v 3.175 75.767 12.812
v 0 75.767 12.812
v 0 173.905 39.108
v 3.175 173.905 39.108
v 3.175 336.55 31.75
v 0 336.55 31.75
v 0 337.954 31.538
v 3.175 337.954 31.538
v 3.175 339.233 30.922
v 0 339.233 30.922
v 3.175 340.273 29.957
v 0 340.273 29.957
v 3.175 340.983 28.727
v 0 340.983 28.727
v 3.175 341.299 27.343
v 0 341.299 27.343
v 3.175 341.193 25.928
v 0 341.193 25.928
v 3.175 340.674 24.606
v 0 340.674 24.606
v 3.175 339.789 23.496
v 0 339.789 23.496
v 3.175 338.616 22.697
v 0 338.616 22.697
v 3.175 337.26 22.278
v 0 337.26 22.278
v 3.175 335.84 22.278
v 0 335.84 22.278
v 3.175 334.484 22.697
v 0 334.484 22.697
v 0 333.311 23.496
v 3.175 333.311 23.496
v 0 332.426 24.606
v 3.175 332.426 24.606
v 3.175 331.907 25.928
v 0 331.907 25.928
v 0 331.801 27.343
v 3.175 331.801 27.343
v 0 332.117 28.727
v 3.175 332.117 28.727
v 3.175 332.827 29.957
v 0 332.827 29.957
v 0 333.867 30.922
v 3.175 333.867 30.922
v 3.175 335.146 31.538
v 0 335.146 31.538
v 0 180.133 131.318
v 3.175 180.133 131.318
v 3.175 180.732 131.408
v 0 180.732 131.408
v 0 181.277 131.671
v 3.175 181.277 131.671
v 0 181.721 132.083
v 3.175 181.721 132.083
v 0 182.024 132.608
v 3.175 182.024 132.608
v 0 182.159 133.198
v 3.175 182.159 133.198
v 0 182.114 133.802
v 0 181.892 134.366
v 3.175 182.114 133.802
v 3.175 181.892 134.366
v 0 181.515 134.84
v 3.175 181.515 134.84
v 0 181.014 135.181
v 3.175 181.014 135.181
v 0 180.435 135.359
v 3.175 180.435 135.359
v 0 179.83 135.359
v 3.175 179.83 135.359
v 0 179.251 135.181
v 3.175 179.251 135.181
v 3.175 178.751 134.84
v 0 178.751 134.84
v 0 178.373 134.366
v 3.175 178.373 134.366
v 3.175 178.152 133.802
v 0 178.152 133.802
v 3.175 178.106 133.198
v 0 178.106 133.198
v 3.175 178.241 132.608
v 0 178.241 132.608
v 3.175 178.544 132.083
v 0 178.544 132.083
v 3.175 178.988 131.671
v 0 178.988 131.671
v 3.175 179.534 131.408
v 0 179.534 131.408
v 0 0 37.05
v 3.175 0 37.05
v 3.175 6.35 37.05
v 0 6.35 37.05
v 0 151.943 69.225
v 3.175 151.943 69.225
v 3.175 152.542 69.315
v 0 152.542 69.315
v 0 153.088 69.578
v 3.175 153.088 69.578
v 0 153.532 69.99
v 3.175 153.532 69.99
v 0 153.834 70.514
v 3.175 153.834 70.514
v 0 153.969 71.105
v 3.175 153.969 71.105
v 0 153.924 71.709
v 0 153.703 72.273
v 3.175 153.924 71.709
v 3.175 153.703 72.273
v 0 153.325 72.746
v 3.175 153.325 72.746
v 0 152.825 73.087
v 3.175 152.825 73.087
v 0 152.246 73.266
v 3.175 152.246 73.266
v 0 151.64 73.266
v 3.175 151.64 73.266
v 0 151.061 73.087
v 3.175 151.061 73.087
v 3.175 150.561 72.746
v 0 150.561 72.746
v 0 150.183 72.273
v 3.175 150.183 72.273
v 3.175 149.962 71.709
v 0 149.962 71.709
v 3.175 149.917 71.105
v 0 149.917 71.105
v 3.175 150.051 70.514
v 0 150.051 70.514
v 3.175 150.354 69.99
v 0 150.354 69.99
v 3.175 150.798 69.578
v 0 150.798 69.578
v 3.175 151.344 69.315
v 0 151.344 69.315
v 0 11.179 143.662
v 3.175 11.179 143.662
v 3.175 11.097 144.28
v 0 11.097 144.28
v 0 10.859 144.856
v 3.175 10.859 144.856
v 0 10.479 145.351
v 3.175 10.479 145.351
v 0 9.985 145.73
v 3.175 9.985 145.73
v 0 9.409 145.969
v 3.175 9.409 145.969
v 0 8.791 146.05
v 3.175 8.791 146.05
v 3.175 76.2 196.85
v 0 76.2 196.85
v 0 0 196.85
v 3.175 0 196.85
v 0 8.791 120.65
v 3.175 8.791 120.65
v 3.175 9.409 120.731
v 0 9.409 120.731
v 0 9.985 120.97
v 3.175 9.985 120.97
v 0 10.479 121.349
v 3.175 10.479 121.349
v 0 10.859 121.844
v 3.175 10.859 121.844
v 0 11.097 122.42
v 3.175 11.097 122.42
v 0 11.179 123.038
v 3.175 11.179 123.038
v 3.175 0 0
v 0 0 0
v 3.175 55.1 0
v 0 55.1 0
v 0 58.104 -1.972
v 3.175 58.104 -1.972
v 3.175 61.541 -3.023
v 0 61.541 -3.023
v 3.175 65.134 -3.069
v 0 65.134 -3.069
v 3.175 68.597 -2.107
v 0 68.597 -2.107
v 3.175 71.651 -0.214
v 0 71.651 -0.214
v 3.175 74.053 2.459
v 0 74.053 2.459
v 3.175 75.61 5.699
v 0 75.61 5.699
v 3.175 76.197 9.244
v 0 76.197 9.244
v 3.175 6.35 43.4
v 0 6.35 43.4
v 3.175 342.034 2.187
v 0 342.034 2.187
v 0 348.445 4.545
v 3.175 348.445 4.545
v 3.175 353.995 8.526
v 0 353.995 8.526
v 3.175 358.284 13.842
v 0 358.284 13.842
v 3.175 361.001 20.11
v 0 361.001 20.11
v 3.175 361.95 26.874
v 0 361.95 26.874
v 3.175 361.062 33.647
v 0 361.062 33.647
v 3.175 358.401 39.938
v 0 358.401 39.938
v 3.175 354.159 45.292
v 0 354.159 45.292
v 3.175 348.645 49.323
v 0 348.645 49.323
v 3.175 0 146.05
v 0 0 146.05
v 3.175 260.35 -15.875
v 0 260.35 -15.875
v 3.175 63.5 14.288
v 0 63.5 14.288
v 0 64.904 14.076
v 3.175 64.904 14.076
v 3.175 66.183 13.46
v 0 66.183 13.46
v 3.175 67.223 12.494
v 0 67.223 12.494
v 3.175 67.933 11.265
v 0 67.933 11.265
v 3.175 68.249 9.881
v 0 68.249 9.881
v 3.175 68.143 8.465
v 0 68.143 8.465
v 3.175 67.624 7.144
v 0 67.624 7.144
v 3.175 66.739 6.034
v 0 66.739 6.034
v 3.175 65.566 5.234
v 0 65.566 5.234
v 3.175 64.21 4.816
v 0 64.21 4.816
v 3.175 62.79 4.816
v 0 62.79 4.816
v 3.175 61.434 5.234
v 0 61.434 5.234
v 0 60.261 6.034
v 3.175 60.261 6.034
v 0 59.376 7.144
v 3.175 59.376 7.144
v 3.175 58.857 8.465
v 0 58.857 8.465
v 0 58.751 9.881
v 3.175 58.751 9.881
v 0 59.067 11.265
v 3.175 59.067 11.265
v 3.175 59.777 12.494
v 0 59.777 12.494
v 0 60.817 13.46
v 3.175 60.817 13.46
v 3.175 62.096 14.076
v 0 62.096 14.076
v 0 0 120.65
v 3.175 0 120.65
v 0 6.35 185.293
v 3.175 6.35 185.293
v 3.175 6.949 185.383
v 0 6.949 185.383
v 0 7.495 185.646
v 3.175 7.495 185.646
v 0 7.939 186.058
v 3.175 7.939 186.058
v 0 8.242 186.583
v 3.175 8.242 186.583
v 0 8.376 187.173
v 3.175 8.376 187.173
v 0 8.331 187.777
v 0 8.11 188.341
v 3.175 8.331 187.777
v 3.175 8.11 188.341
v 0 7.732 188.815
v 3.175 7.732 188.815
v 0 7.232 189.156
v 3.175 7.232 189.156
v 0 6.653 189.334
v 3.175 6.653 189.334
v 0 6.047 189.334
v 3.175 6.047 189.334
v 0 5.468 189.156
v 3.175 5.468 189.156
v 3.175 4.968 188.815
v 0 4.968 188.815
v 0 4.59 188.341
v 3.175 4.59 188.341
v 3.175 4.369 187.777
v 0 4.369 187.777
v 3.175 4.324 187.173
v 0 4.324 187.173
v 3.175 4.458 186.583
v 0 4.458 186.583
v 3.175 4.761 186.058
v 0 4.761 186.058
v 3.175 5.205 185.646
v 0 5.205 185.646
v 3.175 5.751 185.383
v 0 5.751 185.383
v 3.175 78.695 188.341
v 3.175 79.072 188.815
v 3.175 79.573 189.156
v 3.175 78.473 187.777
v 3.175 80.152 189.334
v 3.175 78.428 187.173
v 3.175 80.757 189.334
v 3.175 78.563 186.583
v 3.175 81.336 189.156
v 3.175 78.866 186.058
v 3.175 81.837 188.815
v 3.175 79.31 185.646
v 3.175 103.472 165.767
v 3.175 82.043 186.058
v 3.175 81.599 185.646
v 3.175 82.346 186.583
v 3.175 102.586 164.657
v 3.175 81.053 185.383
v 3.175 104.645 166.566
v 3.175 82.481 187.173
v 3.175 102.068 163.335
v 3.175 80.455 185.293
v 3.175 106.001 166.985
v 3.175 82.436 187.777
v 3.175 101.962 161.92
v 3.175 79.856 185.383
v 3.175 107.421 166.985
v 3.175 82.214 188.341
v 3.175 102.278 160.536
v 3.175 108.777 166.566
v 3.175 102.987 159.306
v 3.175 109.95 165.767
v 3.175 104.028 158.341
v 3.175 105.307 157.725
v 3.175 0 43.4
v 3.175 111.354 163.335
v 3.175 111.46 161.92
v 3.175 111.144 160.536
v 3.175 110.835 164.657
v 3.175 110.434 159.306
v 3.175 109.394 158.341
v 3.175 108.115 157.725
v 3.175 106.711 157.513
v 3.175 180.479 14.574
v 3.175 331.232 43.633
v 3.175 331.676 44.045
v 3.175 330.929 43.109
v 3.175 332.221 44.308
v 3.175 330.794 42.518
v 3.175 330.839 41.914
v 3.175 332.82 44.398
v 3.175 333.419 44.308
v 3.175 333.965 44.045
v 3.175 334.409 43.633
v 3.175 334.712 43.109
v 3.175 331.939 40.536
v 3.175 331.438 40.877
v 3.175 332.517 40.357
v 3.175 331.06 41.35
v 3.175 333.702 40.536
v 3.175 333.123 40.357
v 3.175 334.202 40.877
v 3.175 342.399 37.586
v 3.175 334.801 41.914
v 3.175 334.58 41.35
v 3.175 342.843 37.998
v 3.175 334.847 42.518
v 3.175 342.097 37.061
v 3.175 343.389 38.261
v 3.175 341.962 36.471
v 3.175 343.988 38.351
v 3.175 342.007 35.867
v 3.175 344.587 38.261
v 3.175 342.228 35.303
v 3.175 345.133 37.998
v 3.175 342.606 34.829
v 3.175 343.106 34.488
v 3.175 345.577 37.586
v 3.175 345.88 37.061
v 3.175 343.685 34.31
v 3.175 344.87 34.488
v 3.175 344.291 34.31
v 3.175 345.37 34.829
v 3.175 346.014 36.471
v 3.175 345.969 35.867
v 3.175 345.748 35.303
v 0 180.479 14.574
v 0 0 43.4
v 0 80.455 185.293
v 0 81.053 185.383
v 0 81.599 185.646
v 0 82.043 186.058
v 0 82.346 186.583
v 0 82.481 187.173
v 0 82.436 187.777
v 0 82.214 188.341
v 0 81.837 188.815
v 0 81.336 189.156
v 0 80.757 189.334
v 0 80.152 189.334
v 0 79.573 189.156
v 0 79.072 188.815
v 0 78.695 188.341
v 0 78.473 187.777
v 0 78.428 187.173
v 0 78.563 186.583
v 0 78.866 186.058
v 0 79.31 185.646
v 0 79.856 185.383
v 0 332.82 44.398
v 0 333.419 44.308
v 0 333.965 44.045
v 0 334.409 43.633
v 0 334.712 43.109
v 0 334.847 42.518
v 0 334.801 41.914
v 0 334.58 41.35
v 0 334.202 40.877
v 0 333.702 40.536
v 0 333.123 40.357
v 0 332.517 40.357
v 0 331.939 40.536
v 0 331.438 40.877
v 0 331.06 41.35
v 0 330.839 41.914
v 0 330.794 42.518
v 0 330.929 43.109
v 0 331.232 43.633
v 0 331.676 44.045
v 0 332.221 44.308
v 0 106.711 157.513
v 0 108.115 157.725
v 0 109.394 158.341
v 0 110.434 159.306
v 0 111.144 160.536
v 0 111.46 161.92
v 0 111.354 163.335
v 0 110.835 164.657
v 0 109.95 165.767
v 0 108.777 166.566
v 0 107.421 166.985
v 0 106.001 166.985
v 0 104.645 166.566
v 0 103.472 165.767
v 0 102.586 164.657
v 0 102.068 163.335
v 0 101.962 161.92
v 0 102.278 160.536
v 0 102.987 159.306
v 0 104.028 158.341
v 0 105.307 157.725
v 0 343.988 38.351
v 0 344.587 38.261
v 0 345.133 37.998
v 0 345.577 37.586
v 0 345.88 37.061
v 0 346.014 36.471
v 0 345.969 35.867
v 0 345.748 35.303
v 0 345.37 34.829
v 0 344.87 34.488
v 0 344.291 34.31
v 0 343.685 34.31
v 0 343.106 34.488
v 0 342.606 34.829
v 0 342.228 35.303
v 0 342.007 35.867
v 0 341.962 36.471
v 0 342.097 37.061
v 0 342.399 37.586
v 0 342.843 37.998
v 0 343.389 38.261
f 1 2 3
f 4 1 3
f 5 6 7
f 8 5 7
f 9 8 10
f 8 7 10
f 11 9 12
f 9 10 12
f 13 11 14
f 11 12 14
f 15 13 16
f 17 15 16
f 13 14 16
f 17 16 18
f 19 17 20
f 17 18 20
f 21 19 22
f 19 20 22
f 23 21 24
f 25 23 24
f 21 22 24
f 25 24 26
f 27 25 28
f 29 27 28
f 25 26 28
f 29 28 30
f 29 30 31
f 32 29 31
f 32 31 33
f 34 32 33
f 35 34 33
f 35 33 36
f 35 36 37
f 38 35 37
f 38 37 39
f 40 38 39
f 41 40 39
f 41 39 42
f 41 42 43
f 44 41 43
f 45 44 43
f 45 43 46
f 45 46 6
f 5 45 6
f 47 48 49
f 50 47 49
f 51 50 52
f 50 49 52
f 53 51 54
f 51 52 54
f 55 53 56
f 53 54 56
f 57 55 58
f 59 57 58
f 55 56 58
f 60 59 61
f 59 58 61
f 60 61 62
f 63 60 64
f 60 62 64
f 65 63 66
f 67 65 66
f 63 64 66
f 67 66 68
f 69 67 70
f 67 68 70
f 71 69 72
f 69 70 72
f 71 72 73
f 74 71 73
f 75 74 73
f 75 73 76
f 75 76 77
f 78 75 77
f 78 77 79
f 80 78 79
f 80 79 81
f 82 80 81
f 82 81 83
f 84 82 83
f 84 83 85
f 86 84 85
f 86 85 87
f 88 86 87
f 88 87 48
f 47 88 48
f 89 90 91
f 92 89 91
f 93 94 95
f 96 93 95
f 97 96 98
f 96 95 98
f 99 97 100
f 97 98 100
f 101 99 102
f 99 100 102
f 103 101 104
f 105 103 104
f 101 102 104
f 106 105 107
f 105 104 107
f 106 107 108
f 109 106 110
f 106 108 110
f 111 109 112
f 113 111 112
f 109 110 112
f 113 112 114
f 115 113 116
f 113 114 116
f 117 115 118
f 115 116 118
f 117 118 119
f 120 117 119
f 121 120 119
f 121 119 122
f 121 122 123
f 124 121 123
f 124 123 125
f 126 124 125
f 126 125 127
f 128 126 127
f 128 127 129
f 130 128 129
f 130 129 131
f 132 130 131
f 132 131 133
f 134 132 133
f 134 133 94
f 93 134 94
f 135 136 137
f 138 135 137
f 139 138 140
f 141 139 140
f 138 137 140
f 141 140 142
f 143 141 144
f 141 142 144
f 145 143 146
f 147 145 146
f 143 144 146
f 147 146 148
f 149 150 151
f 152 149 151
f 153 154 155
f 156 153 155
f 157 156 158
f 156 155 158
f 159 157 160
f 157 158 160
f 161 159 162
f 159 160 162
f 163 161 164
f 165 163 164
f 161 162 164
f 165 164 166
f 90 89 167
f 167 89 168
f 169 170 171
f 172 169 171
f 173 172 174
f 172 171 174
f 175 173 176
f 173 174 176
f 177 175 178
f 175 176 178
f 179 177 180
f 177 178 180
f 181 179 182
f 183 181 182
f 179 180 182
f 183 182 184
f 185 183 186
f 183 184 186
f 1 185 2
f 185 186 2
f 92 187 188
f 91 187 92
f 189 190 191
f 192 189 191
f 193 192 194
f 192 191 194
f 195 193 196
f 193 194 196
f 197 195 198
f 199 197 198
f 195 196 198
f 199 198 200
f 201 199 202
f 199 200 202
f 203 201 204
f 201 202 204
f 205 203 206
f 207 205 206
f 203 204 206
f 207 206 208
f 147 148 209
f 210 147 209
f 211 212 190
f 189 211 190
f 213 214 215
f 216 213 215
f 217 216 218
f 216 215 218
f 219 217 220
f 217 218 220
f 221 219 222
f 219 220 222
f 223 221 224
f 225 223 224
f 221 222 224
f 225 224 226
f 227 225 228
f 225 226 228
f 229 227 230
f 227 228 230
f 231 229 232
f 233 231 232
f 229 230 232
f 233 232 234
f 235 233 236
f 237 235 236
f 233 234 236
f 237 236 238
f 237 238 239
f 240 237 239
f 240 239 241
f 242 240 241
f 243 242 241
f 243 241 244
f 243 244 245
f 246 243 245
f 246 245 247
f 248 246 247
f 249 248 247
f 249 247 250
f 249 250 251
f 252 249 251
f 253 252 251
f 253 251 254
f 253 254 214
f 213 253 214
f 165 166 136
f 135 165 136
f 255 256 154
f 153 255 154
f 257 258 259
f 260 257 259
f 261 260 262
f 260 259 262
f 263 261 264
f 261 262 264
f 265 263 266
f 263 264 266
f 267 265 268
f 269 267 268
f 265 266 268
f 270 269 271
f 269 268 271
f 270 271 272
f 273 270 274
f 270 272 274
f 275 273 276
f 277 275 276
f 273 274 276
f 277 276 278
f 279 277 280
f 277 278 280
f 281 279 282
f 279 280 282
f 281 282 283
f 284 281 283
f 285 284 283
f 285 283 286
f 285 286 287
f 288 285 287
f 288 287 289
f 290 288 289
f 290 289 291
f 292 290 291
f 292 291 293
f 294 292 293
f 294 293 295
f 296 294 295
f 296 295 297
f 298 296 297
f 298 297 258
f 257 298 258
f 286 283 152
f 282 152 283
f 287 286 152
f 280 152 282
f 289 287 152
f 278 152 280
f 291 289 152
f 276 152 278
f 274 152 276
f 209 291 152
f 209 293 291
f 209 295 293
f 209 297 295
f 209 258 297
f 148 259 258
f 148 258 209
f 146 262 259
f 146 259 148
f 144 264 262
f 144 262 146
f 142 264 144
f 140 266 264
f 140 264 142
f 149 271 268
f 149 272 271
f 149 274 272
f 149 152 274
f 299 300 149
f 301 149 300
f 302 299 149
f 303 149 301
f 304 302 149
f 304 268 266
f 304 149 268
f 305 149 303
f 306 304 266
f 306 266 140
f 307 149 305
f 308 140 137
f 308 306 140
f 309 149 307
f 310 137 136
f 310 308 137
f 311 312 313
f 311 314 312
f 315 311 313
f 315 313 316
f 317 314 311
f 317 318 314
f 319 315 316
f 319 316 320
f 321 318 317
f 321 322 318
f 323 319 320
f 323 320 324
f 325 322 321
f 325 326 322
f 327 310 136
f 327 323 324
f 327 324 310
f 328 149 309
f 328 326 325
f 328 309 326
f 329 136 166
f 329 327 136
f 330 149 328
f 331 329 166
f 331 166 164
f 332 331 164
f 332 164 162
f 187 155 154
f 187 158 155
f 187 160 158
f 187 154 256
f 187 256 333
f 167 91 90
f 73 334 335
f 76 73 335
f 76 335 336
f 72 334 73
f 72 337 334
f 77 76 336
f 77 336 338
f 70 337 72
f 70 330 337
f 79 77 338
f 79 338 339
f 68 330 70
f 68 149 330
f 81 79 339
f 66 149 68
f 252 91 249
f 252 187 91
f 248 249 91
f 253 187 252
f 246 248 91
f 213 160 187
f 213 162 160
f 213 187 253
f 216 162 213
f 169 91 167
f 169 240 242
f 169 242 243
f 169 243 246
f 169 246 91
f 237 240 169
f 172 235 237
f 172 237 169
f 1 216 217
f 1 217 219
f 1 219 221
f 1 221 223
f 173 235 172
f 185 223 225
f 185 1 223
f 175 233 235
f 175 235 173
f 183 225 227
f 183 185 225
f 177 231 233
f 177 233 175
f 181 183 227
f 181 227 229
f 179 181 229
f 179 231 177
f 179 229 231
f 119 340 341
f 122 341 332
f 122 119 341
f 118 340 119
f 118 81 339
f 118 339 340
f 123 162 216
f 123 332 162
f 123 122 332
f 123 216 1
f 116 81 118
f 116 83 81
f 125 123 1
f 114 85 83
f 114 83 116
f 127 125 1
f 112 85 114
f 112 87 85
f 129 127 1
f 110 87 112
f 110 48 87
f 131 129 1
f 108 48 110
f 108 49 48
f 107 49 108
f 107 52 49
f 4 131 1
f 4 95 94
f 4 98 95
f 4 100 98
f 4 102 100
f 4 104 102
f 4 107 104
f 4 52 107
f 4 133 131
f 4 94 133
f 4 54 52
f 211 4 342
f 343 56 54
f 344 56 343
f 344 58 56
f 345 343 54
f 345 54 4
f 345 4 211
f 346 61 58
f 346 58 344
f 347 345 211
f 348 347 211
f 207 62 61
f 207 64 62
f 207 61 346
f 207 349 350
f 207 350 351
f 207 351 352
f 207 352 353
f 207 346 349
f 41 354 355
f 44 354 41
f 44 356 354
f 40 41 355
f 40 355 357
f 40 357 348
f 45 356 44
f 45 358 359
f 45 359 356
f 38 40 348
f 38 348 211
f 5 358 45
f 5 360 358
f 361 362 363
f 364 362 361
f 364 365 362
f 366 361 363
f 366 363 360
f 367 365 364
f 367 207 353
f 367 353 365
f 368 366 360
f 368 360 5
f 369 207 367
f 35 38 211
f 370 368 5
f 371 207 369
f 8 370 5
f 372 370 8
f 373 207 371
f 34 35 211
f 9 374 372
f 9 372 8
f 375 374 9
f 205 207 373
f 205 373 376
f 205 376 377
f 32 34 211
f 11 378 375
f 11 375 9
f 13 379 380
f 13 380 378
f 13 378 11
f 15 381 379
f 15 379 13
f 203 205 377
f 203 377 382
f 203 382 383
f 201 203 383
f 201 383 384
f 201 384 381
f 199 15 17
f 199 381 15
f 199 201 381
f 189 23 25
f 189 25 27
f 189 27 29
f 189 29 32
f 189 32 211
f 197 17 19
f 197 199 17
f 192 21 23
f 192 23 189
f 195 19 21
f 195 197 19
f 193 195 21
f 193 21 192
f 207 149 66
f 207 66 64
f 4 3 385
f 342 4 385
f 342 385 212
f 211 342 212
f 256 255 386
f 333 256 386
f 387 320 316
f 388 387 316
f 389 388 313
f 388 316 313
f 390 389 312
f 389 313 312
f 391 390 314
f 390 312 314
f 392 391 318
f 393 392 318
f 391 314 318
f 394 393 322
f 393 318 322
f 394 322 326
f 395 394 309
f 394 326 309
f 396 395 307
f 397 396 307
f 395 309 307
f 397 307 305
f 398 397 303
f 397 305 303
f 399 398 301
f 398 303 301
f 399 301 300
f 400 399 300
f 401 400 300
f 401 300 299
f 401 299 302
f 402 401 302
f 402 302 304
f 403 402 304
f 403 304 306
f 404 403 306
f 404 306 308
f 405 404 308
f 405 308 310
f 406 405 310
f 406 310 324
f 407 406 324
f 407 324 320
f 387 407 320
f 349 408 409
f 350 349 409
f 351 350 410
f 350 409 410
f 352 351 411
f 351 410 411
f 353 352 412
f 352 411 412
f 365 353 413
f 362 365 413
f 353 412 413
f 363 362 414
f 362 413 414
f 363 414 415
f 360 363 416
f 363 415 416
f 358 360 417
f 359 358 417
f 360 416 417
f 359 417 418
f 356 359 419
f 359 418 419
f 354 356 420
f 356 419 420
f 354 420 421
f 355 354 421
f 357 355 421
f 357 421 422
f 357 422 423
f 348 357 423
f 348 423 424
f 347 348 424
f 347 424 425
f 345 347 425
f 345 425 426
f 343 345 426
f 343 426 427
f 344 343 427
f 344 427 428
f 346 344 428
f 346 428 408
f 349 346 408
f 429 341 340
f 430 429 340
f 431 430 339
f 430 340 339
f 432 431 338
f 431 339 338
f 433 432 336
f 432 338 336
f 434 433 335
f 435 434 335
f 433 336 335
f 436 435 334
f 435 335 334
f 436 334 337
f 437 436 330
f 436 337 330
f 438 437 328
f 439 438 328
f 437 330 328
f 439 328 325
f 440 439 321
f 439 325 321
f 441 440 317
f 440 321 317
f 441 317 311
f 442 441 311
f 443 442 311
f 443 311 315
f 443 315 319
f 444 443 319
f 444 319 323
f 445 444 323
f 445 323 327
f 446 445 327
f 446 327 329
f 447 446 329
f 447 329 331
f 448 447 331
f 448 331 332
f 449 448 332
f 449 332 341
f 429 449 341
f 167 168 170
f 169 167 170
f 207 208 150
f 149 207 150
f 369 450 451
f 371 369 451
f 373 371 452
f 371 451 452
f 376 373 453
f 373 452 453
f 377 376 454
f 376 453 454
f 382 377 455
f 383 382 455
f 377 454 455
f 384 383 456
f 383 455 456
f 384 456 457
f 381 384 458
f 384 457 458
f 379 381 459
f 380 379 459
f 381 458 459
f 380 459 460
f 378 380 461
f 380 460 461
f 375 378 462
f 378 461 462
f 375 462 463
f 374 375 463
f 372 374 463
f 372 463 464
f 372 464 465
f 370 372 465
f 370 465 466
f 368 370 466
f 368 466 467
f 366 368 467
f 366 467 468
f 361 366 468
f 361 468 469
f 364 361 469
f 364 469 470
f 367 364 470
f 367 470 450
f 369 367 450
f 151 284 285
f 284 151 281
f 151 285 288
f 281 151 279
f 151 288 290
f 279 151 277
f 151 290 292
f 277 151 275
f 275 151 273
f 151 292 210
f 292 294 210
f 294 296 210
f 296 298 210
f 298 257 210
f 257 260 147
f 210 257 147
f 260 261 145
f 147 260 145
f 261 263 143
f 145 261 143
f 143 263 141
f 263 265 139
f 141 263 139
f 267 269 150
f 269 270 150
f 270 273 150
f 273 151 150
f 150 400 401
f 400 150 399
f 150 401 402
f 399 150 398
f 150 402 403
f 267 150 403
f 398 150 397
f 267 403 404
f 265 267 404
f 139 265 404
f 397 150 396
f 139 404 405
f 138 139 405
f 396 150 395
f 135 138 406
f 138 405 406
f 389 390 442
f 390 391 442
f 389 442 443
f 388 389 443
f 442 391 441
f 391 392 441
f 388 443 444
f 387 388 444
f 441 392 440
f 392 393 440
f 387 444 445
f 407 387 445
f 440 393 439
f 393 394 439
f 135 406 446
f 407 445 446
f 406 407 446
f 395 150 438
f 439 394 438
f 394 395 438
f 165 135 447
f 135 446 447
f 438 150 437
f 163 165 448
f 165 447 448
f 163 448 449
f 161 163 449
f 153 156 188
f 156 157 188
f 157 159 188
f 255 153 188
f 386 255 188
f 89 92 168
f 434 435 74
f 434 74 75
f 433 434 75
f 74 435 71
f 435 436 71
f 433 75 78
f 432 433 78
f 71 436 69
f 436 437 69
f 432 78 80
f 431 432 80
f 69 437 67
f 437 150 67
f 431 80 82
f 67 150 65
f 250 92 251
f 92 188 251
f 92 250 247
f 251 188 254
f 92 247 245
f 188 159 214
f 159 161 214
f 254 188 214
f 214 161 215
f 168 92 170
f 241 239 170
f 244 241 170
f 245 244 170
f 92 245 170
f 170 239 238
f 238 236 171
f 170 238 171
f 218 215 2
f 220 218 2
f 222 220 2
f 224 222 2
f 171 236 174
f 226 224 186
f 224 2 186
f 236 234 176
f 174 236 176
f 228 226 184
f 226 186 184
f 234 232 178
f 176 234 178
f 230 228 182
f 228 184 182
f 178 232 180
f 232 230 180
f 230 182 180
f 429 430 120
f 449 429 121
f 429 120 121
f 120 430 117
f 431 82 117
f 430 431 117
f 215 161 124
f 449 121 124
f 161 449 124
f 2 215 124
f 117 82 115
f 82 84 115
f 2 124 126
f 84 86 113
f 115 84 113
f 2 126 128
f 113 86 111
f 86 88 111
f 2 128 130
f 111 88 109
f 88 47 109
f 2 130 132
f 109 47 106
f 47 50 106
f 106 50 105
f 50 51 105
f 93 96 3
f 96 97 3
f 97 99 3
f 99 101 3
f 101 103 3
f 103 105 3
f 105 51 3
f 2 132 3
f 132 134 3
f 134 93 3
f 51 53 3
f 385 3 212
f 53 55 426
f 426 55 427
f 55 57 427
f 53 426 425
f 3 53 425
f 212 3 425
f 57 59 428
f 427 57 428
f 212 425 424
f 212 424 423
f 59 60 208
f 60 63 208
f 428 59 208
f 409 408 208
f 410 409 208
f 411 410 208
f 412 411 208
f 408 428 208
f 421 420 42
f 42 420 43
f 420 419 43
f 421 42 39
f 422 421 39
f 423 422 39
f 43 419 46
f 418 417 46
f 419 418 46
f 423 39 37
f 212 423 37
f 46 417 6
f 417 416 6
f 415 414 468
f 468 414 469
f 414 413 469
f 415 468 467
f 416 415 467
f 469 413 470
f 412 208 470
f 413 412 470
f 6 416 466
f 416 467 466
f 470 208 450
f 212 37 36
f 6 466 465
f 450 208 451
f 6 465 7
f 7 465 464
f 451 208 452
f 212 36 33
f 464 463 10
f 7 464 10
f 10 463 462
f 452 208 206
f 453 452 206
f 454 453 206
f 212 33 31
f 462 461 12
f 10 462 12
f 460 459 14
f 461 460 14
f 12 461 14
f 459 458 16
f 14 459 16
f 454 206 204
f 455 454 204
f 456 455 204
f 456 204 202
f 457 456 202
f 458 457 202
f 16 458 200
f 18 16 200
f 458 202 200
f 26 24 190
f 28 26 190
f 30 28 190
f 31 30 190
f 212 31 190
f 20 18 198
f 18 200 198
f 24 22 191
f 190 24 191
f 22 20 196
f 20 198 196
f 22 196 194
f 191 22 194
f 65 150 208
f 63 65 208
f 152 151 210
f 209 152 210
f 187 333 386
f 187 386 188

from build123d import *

# Parameters (mm, degrees)
BOSS_EXTRUDE1_DEPTH     = 3.175
SKETCH2_W               = 6.35
SKETCH2_H               = 6.35
CUT_EXTRUDE1_DEPTH      = 413.028889309
F_3_8_CLEARANCE_HOLE1_D = 9.525
SKETCH6_R               = 4.7625
CUT_EXTRUDE2_DEPTH      = 413.028889309
SKETCH10_R              = 2.032
CUT_EXTRUDE4_DEPTH      = 413.028889309
SKETCH11_R              = 2.032
CUT_EXTRUDE5_DEPTH      = 413.028889309
SKETCH13_R              = 2.032
CUT_EXTRUDE6_DEPTH      = 413.028889309
SKETCH14_R              = 2.032
CUT_EXTRUDE7_DEPTH      = 413.028889309


with BuildPart() as part:
    # Sketch1 → Boss-Extrude1 (new body)
    with BuildSketch(Plane(origin=(0, 0, 0), x_dir=(0, 0, -1), z_dir=(1, 0, 0))):
        with BuildLine():
            Line((0, 0), (0, 55.099739587))
            ThreePointArc((0, 55.099739587), (1.26919911, 70.191432251), (-12.812001873, 75.767257994))
            Line((-12.812001873, 75.767257994), (-39.108016855, 173.905321945))
            Line((-39.108016855, 173.905321945), (-14.573500867, 180.47932569))
            Line((-14.573500867, 180.47932569), (15.875, 260.35))
            Line((15.875, 260.35), (-2.186548672, 342.033868455))
            ThreePointArc((-2.186548672, 342.033868455), (-23.459772132, 361.703829452), (-49.323139542, 348.644594092))
            Line((-49.323139542, 348.644594092), (-196.85, 76.2))
            Line((-196.85, 76.2), (-196.85, 0))
            Line((-196.85, 0), (0, 0))
        make_face()
    extrude(amount=BOSS_EXTRUDE1_DEPTH)

    # Sketch2 → Cut-Extrude1 (cut, through all)
    with BuildSketch(Plane(origin=(3.175, 0, 0), x_dir=(0, 0, -1), z_dir=(1, 0, 0))):
        with BuildLine():
            Line((-146.05, 8.790931394), (-146.05, 0))
            Line((-146.05, 0), (-120.65, 0))
            Line((-120.65, 0), (-120.65, 8.790931394))
            ThreePointArc((-120.65, 8.790931394), (-121.349311849, 10.479219545), (-123.0376, 11.178531394))
            Line((-123.0376, 11.178531394), (-143.6624, 11.178531394))
            ThreePointArc((-143.6624, 11.178531394), (-145.350688151, 10.479219545), (-146.05, 8.790931394))
        make_face()
        with Locations((-40.225422327, 3.175)):
            Rectangle(SKETCH2_W, SKETCH2_H)
        with Locations((-226.474577673, 3.175)):
            Rectangle(SKETCH2_W, SKETCH2_H)
    extrude(amount=-CUT_EXTRUDE1_DEPTH, mode=Mode.SUBTRACT)

    # 3/8 Clearance Hole1 (through all)
    with Locations(Plane(origin=(3.175, 0, 0), x_dir=(0, 0, -1), z_dir=(1, 0, 0))):
        with Locations((-26.9875, 336.55), (-9.525, 63.5)):
            Hole(F_3_8_CLEARANCE_HOLE1_D / 2)

    # Sketch6 → Cut-Extrude2 (cut, through all)
    with BuildSketch(Plane(origin=(3.175, 0, 0), x_dir=(0, 0, -1), z_dir=(1, 0, 0))):
        with Locations((-162.275586362, 106.71087433)):
            Circle(SKETCH6_R)
    extrude(amount=-CUT_EXTRUDE2_DEPTH, mode=Mode.SUBTRACT)

    # Sketch10 → Cut-Extrude4 (cut, through all)
    with BuildSketch(Plane(origin=(3.175, 0, 0), x_dir=(0, 0, -1), z_dir=(1, 0, 0))):
        with Locations((-71.256645538, 151.942863158)):
            Circle(SKETCH10_R)
    extrude(amount=-CUT_EXTRUDE4_DEPTH, mode=Mode.SUBTRACT)

    # Sketch11 → Cut-Extrude5 (cut, through all)
    with BuildSketch(Plane(origin=(3.175, 0, 0), x_dir=(0, 0, -1), z_dir=(1, 0, 0))):
        with Locations((-187.325, 80.45454267)):
            Circle(SKETCH11_R)
        with Locations((-187.325, 6.35)):
            Circle(SKETCH11_R)
    extrude(amount=-CUT_EXTRUDE5_DEPTH, mode=Mode.SUBTRACT)

    # Sketch13 → Cut-Extrude6 (cut, through all)
    with BuildSketch(Plane.ZY):
        with Locations((36.31904262, 343.988077457)):
            Circle(SKETCH13_R)
        with Locations((42.366339666, 332.820257685)):
            Circle(SKETCH13_R)
    extrude(amount=-CUT_EXTRUDE6_DEPTH, mode=Mode.SUBTRACT)

    # Sketch14 → Cut-Extrude7 (cut, through all)
    with BuildSketch(Plane(origin=(3.175, 0, 0), x_dir=(0, 0, -1), z_dir=(1, 0, 0))):
        with Locations((-133.35, 180.132641428)):
            Circle(SKETCH14_R)
    extrude(amount=-CUT_EXTRUDE7_DEPTH, mode=Mode.SUBTRACT)


solid = part.part
